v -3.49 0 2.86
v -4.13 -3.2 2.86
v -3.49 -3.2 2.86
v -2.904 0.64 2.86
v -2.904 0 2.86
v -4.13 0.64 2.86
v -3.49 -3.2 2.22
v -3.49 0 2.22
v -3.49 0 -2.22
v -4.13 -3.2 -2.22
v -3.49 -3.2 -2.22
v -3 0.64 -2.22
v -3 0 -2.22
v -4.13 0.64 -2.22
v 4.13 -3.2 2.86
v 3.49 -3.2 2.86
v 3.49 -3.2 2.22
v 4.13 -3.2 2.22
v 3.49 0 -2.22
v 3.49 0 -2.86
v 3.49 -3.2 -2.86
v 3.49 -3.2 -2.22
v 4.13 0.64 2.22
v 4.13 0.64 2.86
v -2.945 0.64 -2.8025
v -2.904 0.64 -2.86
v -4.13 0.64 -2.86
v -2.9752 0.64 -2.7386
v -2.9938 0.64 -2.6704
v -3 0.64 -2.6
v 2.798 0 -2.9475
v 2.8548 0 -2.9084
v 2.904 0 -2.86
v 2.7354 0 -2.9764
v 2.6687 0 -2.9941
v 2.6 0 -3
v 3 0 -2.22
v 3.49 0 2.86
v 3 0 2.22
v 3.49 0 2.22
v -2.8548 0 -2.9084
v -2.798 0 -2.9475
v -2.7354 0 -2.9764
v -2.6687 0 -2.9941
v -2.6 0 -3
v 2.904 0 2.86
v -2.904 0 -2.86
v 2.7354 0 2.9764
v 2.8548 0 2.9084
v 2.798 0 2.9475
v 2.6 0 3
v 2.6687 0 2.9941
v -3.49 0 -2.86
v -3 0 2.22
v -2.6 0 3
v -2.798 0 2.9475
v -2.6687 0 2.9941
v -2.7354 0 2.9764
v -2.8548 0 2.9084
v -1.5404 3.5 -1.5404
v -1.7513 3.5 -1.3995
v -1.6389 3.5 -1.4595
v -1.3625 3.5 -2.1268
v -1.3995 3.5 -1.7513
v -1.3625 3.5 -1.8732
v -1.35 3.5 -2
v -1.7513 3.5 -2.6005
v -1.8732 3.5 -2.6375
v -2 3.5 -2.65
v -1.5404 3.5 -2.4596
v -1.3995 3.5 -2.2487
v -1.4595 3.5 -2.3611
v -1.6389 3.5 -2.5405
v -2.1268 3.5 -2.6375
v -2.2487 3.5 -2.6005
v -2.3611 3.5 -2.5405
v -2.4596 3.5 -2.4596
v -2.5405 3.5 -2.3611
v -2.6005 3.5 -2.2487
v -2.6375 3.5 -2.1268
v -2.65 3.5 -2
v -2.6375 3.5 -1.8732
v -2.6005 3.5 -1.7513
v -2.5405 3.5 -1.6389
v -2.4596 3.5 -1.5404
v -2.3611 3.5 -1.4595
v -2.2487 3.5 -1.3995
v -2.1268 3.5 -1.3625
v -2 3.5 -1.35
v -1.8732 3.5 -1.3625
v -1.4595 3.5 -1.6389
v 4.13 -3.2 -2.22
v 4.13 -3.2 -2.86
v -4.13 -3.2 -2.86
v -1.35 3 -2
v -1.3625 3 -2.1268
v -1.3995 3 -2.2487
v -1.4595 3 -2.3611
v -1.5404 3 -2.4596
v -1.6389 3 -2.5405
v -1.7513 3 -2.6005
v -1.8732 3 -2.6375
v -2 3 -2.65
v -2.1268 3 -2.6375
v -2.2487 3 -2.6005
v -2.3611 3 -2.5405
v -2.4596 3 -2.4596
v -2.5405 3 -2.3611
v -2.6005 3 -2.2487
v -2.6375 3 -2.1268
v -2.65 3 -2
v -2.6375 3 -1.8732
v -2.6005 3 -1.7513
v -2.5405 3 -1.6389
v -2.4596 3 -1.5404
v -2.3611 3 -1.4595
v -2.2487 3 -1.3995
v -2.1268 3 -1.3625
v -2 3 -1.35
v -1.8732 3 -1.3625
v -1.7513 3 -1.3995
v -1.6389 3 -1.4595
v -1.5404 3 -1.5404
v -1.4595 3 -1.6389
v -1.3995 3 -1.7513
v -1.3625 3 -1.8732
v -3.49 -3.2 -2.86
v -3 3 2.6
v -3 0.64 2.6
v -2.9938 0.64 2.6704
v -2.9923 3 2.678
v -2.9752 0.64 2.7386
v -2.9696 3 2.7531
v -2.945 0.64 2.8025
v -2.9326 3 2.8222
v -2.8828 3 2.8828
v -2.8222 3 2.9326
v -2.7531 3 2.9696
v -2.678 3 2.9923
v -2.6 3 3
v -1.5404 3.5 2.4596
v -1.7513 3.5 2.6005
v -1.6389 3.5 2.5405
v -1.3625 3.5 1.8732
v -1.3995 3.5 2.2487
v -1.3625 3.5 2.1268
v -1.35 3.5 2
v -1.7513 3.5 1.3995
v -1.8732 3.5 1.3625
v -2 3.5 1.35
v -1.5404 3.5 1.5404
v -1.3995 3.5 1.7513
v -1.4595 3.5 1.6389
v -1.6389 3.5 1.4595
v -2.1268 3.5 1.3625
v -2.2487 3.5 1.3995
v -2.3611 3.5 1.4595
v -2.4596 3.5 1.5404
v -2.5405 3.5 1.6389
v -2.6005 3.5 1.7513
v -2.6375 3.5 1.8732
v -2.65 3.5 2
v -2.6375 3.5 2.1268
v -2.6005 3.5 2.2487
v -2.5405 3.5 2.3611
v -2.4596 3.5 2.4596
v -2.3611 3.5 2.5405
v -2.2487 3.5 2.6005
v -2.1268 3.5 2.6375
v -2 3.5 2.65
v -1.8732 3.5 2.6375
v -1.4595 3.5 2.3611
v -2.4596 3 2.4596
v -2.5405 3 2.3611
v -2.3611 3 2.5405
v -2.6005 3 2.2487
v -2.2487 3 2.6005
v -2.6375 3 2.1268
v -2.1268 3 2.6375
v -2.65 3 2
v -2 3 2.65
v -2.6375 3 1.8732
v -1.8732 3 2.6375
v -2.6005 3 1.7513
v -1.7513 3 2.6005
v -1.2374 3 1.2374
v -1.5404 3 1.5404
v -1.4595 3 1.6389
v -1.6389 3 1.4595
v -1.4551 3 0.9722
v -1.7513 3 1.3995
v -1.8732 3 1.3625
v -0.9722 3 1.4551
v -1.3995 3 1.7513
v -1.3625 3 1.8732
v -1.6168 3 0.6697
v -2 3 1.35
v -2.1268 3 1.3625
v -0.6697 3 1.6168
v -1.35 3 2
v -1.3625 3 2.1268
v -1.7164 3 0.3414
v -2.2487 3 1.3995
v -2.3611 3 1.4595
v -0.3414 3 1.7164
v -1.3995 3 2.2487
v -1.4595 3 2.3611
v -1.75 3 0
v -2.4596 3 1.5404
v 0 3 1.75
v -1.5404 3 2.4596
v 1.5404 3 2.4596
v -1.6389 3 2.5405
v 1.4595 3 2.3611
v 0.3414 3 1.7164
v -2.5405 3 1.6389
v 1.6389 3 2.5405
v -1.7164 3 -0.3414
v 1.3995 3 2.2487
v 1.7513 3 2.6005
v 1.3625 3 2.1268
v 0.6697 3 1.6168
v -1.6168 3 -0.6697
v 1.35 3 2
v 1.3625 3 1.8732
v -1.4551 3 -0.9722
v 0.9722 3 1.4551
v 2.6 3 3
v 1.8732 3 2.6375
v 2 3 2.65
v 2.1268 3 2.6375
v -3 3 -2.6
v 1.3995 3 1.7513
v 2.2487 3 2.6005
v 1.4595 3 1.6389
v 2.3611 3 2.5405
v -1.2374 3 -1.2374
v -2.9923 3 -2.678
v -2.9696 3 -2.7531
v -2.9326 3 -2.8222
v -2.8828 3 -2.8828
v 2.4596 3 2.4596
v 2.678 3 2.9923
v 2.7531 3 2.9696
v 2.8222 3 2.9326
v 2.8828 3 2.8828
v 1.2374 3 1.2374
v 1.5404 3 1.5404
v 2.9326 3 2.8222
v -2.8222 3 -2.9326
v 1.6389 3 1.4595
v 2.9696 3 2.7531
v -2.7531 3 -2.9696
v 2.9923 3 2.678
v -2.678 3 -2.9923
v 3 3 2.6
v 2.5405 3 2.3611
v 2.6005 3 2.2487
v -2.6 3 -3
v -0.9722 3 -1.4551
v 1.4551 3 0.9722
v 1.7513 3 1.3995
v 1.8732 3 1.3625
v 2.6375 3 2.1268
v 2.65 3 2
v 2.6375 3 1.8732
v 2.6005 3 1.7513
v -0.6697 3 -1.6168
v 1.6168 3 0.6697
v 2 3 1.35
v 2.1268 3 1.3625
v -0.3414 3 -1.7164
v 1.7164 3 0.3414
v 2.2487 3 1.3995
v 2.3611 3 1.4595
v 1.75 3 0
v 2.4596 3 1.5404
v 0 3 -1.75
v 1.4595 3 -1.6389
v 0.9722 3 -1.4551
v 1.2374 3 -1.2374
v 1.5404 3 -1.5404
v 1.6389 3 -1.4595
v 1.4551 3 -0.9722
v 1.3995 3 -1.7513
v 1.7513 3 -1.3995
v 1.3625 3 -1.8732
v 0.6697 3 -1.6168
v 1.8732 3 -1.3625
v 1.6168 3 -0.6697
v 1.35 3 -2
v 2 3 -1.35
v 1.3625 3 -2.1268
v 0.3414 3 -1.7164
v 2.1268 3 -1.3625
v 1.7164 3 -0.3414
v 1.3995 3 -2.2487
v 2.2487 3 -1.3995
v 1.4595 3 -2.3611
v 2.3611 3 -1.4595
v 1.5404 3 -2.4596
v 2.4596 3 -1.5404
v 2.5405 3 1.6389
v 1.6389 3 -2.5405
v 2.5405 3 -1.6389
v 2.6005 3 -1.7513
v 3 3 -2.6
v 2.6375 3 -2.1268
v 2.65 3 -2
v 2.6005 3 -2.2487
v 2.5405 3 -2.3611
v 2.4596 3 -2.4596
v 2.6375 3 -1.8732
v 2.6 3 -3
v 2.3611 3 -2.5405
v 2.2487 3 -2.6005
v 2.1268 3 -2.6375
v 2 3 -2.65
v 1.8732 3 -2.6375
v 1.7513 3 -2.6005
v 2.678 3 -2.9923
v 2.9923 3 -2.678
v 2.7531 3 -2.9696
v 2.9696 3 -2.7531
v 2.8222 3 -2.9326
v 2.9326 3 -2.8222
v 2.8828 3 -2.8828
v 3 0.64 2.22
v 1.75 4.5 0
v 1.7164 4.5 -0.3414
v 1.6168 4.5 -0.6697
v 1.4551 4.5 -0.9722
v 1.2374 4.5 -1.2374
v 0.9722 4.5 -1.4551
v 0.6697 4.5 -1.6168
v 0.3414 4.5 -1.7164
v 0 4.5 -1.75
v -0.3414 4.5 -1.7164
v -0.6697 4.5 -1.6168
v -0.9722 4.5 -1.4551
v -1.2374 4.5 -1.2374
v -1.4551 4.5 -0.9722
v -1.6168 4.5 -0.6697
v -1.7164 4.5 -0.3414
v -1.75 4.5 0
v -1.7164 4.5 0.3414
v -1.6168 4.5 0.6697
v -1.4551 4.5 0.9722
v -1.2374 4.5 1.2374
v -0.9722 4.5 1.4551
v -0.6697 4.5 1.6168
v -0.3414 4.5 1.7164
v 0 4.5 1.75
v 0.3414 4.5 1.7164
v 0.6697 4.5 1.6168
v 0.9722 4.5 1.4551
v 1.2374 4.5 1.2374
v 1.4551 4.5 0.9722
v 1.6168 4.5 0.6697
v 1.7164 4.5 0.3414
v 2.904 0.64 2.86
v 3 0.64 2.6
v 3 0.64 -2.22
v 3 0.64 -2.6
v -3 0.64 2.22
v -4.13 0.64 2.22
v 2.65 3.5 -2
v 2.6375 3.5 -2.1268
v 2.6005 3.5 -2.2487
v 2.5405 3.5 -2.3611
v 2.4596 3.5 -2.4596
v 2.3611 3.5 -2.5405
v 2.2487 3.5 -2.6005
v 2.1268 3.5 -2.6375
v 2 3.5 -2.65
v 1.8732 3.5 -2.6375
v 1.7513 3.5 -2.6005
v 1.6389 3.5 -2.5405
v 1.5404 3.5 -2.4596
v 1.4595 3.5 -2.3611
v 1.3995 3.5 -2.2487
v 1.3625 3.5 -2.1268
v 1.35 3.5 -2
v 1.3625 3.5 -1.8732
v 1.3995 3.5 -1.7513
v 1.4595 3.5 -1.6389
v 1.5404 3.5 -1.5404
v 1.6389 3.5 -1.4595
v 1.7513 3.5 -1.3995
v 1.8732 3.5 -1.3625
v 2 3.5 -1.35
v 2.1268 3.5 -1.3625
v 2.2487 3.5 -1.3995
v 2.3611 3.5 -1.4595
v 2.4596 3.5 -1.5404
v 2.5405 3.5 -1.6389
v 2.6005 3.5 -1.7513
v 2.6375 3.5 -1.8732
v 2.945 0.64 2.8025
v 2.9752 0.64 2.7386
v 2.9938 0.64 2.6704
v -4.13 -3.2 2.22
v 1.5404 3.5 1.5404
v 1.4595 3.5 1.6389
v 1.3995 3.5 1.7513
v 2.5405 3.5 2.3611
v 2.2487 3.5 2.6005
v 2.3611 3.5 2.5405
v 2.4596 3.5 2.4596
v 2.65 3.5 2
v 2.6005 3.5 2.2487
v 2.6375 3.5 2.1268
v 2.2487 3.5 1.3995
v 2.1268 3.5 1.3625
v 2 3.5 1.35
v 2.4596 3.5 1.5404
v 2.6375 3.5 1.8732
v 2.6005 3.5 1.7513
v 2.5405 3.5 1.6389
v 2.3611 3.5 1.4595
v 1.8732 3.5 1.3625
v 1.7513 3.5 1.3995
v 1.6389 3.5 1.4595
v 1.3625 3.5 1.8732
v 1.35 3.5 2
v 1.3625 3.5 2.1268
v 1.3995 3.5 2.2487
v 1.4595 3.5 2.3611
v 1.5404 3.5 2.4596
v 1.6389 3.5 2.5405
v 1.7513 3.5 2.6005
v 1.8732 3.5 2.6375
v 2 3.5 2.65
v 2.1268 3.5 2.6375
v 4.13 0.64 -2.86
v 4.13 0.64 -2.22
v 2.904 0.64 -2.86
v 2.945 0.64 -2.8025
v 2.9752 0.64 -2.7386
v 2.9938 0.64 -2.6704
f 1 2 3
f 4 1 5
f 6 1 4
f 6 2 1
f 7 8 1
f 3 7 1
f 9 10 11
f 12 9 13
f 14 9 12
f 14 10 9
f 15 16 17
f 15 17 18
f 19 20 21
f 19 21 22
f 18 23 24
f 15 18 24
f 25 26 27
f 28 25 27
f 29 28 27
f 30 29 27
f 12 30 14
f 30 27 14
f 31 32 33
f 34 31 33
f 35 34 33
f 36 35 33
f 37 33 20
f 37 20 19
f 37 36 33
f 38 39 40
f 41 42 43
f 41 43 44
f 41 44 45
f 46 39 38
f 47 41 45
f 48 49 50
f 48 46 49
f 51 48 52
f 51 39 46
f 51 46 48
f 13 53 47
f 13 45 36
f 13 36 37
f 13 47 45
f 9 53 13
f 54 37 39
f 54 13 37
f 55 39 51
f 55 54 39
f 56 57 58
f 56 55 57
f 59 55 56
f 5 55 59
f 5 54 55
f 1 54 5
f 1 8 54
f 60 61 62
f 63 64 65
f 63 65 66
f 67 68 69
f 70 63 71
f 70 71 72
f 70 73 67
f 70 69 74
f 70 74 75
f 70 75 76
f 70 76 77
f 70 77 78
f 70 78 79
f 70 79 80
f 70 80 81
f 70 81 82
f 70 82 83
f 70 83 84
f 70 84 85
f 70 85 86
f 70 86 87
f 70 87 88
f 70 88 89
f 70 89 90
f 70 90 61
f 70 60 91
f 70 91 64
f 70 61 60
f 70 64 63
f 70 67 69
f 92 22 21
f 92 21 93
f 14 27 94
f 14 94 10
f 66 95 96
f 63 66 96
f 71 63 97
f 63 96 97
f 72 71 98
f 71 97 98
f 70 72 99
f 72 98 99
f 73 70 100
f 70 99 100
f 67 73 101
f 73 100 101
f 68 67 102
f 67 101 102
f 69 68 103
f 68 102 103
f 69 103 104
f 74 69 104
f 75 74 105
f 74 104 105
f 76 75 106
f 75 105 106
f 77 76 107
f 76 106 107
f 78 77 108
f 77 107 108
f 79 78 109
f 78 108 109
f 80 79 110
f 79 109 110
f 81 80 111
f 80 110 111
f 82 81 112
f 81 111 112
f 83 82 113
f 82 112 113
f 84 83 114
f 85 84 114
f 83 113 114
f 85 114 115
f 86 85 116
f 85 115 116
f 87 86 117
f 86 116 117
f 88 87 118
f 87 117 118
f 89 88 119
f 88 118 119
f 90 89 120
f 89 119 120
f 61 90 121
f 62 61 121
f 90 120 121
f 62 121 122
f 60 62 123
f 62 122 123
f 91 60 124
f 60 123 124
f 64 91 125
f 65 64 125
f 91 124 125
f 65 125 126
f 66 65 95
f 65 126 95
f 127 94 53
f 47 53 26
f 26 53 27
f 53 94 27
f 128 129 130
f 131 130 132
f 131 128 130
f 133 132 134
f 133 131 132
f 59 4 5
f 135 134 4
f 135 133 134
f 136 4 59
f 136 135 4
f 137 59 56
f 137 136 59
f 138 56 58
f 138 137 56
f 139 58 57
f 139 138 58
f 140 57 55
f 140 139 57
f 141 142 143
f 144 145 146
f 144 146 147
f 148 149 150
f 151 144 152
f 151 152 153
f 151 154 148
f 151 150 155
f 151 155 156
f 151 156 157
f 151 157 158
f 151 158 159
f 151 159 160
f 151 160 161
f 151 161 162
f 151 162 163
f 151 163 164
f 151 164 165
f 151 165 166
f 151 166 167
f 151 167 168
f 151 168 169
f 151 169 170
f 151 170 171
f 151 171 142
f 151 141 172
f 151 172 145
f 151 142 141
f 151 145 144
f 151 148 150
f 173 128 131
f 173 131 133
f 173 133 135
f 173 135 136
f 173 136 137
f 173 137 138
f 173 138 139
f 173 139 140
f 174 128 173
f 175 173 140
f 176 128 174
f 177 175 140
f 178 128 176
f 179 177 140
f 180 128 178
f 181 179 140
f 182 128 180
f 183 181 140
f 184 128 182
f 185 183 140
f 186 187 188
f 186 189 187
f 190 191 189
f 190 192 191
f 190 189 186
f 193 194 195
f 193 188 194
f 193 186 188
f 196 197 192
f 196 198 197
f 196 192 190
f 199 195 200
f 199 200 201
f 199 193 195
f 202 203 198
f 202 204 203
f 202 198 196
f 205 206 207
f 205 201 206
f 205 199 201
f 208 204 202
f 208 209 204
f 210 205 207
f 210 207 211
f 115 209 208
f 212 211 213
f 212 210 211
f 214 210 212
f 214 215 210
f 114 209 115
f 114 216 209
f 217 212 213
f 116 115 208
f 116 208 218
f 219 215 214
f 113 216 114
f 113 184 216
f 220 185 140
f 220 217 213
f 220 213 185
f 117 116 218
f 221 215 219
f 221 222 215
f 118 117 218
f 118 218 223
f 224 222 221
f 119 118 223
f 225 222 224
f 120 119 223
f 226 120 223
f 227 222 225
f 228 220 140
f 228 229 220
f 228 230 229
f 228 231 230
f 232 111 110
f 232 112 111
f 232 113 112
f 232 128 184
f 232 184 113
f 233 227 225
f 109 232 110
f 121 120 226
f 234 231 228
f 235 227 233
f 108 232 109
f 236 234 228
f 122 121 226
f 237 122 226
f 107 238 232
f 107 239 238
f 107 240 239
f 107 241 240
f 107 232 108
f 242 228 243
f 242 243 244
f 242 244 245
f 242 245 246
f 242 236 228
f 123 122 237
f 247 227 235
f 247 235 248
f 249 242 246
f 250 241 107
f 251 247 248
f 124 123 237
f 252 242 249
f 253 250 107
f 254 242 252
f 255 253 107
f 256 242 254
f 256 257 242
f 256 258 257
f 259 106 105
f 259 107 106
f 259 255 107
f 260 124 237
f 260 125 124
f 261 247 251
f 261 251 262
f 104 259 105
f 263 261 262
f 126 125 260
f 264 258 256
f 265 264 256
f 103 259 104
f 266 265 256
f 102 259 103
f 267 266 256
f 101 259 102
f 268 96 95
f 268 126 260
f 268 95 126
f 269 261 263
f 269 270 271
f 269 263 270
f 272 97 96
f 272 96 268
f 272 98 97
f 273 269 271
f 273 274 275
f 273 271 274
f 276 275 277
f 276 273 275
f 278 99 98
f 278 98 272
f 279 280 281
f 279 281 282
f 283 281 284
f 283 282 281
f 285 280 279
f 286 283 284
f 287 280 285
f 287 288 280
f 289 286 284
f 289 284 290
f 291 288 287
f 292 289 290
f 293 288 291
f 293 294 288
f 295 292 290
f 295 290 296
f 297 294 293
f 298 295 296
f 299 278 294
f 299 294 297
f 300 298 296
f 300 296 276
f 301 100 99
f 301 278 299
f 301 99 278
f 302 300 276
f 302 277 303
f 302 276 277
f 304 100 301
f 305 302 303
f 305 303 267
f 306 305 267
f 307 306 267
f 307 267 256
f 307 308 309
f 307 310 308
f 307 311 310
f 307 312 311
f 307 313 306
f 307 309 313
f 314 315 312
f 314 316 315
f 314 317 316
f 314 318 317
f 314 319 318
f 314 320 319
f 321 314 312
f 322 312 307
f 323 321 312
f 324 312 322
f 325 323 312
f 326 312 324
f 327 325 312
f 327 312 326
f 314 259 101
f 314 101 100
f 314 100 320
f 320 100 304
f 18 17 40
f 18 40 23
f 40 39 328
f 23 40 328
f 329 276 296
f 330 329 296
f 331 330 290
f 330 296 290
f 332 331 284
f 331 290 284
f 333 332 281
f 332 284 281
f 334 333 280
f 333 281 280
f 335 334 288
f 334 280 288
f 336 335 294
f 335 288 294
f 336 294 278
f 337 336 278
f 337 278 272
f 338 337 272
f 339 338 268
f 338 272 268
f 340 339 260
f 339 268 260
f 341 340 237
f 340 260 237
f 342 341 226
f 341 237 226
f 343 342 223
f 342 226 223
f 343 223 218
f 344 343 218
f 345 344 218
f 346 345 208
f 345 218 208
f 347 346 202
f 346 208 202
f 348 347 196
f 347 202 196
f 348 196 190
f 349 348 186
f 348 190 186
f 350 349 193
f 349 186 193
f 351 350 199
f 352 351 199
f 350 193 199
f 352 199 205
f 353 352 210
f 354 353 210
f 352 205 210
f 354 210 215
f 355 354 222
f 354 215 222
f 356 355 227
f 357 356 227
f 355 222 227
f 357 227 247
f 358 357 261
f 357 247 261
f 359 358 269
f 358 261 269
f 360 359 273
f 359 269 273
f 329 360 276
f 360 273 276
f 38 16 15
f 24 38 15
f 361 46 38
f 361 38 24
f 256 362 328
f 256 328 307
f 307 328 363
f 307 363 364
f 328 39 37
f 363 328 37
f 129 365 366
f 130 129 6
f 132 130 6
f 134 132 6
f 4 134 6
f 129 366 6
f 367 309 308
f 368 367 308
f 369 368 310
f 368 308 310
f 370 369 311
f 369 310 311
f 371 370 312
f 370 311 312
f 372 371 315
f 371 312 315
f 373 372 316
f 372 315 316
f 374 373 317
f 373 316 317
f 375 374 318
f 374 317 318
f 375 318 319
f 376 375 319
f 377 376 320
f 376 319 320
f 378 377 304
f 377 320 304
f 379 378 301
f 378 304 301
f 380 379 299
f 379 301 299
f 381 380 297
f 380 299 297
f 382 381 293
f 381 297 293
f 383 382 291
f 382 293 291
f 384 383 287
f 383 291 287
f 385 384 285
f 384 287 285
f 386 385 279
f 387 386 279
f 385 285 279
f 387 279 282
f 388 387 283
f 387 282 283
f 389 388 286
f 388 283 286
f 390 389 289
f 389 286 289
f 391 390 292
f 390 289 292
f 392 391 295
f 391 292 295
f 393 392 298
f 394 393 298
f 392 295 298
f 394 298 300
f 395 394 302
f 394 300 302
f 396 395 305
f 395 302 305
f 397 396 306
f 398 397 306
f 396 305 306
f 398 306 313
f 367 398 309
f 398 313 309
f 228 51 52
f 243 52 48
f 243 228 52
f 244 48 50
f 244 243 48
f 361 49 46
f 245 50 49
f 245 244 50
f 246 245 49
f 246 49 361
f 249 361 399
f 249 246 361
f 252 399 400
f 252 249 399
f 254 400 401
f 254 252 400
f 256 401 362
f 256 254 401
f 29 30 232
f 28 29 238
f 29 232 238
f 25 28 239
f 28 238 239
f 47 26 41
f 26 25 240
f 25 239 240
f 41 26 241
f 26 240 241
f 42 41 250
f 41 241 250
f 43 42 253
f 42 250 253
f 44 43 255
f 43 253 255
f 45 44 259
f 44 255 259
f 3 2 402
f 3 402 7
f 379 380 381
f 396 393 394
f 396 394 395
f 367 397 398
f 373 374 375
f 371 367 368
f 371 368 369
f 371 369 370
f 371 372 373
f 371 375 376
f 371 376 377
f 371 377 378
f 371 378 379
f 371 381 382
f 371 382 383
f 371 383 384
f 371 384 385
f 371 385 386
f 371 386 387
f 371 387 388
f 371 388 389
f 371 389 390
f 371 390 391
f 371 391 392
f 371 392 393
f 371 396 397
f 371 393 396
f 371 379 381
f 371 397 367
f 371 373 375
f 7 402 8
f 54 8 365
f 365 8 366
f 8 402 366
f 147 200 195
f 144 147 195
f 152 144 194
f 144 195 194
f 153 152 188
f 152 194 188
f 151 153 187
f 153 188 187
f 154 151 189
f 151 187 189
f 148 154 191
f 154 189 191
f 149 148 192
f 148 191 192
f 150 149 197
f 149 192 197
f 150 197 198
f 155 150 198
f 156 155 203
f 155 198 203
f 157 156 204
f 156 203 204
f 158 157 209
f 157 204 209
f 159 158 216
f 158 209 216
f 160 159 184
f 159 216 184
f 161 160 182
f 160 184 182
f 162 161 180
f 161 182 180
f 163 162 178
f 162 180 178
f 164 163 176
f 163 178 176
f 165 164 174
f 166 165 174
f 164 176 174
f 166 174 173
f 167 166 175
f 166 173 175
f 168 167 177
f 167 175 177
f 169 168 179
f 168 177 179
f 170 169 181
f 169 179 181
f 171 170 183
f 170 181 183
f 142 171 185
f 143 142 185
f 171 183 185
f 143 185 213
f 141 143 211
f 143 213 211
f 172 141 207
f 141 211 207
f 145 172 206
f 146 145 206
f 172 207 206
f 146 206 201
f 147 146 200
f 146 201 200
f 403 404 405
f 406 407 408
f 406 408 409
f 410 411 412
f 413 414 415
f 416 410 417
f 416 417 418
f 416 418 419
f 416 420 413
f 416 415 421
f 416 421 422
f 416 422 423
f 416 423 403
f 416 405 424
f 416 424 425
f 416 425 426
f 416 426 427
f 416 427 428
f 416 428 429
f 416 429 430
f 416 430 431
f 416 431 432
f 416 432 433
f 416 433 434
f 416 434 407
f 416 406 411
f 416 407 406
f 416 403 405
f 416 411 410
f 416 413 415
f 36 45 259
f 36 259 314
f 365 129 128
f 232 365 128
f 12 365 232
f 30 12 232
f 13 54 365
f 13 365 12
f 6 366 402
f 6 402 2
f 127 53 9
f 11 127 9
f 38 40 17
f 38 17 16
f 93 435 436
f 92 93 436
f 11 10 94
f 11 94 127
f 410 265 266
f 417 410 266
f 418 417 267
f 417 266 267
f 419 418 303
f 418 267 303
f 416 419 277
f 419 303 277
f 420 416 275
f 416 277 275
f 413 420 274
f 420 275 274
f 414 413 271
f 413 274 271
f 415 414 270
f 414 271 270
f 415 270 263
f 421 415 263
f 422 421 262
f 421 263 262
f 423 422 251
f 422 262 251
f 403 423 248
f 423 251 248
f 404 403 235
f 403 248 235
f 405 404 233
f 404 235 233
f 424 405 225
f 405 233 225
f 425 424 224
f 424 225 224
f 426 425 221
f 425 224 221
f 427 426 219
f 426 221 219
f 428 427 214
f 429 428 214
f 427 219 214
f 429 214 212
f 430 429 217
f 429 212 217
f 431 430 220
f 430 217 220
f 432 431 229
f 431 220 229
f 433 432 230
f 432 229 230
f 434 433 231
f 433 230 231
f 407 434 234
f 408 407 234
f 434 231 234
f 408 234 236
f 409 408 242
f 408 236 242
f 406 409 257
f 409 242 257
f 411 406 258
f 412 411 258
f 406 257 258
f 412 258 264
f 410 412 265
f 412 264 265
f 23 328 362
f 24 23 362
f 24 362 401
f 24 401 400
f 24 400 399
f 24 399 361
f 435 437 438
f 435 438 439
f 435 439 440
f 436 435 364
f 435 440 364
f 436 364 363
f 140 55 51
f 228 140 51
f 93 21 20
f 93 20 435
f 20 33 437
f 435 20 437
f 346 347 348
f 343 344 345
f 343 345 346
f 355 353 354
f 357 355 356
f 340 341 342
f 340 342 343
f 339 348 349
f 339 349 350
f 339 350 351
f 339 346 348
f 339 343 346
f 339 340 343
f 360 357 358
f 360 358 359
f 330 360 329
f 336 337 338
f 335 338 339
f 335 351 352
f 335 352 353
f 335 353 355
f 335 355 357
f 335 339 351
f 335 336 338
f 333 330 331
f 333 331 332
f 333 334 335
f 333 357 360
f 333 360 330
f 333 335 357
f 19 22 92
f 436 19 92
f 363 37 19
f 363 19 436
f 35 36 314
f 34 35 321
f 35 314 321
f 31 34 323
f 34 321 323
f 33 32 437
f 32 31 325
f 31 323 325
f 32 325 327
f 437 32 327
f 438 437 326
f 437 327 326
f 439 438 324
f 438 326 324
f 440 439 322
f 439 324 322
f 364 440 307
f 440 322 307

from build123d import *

# Parameters (mm, degrees)
SKETCH1_W             = 6
SKETCH1_H             = 6
BOSS_EXTRUDE1_DEPTH   = 3
SKETCH2_R             = 1.75
BOSS_EXTRUDE2_DEPTH   = 1.5
SKETCH3_R             = 0.65
BOSS_EXTRUDE3_DEPTH   = 0.5
SKETCH4_W             = 0.64
SKETCH4_H             = 0.64
BOSS_EXTRUDE4_DEPTH   = 3.2
BOSS_EXTRUDE4_2_DEPTH = 3.2
BOSS_EXTRUDE4_3_DEPTH = 3.2
BOSS_EXTRUDE4_4_DEPTH = 3.2
FILLET1_R             = 0.4
SKETCH6_W             = 0.64
SKETCH6_H             = 0.64
BOSS_EXTRUDE6_DEPTH   = 8.26


with BuildPart() as part:
    # Sketch1 → Boss-Extrude1 (new body)
    with BuildSketch(Plane(origin=(0, 0, 0), x_dir=(1, 0, 0), z_dir=(0, 1, 0))):
        Rectangle(SKETCH1_W, SKETCH1_H)
    extrude(amount=BOSS_EXTRUDE1_DEPTH)

    # Sketch2 → Boss-Extrude2 (add)
    with BuildSketch(Plane(origin=(0, 3, 0), x_dir=(1, 0, 0), z_dir=(0, 1, 0))):
        Circle(SKETCH2_R)
    extrude(amount=BOSS_EXTRUDE2_DEPTH)

    # Sketch3 → Boss-Extrude3 (add)
    with BuildSketch(Plane(origin=(0, 3, 0), x_dir=(1, 0, 0), z_dir=(0, 1, 0))):
        with Locations((-2, 2)):
            Circle(SKETCH3_R)
        with Locations((-2, -2)):
            Circle(SKETCH3_R)
        with Locations((2, -2)):
            Circle(SKETCH3_R)
        with Locations((2, 2)):
            Circle(SKETCH3_R)
    extrude(amount=BOSS_EXTRUDE3_DEPTH)

    # Fillet1
    fillet1_edges = [part.edges().sort_by_distance(p)[0] for p in [
        (3, 1.5, 3),
        (-3, 1.5, 3),
        (-3, 1.5, -3),
        (3, 1.5, -3),
    ]]
    fillet(fillet1_edges, radius=FILLET1_R)



with BuildPart() as body_2:
    # Sketch4 → Boss-Extrude4 (new body)
    with BuildSketch(Plane.XZ):
        with Locations((-3.81, 2.54)):
            Rectangle(SKETCH4_W, SKETCH4_H)
    extrude(amount=BOSS_EXTRUDE4_DEPTH)


with BuildPart() as body_3:
    # Sketch4 → Boss-Extrude4 2 (new body)
    with BuildSketch(Plane.XZ):
        with Locations((3.81, 2.54)):
            Rectangle(SKETCH4_W, SKETCH4_H)
    extrude(amount=BOSS_EXTRUDE4_2_DEPTH)


with BuildPart() as body_4:
    # Sketch4 → Boss-Extrude4 3 (new body)
    with BuildSketch(Plane.XZ):
        with Locations((3.81, -2.54)):
            Rectangle(SKETCH4_W, SKETCH4_H)
    extrude(amount=BOSS_EXTRUDE4_3_DEPTH)


with BuildPart() as body_5:
    # Sketch4 → Boss-Extrude4 4 (new body)
    with BuildSketch(Plane.XZ):
        with Locations((-3.81, -2.54)):
            Rectangle(SKETCH4_W, SKETCH4_H)
    extrude(amount=BOSS_EXTRUDE4_4_DEPTH)


with BuildPart() as part_1:
    add(part.part)

    add(body_2.part)  # Boss-Extrude6 merges body 2

    add(body_3.part)  # Boss-Extrude6 merges body 3

    add(body_4.part)  # Boss-Extrude6 merges body 4

    add(body_5.part)  # Boss-Extrude6 merges body 5
    # Sketch6 → Boss-Extrude6 (add)
    with BuildSketch(Plane.ZY.offset(4.13)):
        with Locations((-2.54, 0.32)):
            Rectangle(SKETCH6_W, SKETCH6_H)
        with Locations((2.54, 0.32)):
            Rectangle(SKETCH6_W, SKETCH6_H)
    extrude(amount=-BOSS_EXTRUDE6_DEPTH)


solid = part_1.part
